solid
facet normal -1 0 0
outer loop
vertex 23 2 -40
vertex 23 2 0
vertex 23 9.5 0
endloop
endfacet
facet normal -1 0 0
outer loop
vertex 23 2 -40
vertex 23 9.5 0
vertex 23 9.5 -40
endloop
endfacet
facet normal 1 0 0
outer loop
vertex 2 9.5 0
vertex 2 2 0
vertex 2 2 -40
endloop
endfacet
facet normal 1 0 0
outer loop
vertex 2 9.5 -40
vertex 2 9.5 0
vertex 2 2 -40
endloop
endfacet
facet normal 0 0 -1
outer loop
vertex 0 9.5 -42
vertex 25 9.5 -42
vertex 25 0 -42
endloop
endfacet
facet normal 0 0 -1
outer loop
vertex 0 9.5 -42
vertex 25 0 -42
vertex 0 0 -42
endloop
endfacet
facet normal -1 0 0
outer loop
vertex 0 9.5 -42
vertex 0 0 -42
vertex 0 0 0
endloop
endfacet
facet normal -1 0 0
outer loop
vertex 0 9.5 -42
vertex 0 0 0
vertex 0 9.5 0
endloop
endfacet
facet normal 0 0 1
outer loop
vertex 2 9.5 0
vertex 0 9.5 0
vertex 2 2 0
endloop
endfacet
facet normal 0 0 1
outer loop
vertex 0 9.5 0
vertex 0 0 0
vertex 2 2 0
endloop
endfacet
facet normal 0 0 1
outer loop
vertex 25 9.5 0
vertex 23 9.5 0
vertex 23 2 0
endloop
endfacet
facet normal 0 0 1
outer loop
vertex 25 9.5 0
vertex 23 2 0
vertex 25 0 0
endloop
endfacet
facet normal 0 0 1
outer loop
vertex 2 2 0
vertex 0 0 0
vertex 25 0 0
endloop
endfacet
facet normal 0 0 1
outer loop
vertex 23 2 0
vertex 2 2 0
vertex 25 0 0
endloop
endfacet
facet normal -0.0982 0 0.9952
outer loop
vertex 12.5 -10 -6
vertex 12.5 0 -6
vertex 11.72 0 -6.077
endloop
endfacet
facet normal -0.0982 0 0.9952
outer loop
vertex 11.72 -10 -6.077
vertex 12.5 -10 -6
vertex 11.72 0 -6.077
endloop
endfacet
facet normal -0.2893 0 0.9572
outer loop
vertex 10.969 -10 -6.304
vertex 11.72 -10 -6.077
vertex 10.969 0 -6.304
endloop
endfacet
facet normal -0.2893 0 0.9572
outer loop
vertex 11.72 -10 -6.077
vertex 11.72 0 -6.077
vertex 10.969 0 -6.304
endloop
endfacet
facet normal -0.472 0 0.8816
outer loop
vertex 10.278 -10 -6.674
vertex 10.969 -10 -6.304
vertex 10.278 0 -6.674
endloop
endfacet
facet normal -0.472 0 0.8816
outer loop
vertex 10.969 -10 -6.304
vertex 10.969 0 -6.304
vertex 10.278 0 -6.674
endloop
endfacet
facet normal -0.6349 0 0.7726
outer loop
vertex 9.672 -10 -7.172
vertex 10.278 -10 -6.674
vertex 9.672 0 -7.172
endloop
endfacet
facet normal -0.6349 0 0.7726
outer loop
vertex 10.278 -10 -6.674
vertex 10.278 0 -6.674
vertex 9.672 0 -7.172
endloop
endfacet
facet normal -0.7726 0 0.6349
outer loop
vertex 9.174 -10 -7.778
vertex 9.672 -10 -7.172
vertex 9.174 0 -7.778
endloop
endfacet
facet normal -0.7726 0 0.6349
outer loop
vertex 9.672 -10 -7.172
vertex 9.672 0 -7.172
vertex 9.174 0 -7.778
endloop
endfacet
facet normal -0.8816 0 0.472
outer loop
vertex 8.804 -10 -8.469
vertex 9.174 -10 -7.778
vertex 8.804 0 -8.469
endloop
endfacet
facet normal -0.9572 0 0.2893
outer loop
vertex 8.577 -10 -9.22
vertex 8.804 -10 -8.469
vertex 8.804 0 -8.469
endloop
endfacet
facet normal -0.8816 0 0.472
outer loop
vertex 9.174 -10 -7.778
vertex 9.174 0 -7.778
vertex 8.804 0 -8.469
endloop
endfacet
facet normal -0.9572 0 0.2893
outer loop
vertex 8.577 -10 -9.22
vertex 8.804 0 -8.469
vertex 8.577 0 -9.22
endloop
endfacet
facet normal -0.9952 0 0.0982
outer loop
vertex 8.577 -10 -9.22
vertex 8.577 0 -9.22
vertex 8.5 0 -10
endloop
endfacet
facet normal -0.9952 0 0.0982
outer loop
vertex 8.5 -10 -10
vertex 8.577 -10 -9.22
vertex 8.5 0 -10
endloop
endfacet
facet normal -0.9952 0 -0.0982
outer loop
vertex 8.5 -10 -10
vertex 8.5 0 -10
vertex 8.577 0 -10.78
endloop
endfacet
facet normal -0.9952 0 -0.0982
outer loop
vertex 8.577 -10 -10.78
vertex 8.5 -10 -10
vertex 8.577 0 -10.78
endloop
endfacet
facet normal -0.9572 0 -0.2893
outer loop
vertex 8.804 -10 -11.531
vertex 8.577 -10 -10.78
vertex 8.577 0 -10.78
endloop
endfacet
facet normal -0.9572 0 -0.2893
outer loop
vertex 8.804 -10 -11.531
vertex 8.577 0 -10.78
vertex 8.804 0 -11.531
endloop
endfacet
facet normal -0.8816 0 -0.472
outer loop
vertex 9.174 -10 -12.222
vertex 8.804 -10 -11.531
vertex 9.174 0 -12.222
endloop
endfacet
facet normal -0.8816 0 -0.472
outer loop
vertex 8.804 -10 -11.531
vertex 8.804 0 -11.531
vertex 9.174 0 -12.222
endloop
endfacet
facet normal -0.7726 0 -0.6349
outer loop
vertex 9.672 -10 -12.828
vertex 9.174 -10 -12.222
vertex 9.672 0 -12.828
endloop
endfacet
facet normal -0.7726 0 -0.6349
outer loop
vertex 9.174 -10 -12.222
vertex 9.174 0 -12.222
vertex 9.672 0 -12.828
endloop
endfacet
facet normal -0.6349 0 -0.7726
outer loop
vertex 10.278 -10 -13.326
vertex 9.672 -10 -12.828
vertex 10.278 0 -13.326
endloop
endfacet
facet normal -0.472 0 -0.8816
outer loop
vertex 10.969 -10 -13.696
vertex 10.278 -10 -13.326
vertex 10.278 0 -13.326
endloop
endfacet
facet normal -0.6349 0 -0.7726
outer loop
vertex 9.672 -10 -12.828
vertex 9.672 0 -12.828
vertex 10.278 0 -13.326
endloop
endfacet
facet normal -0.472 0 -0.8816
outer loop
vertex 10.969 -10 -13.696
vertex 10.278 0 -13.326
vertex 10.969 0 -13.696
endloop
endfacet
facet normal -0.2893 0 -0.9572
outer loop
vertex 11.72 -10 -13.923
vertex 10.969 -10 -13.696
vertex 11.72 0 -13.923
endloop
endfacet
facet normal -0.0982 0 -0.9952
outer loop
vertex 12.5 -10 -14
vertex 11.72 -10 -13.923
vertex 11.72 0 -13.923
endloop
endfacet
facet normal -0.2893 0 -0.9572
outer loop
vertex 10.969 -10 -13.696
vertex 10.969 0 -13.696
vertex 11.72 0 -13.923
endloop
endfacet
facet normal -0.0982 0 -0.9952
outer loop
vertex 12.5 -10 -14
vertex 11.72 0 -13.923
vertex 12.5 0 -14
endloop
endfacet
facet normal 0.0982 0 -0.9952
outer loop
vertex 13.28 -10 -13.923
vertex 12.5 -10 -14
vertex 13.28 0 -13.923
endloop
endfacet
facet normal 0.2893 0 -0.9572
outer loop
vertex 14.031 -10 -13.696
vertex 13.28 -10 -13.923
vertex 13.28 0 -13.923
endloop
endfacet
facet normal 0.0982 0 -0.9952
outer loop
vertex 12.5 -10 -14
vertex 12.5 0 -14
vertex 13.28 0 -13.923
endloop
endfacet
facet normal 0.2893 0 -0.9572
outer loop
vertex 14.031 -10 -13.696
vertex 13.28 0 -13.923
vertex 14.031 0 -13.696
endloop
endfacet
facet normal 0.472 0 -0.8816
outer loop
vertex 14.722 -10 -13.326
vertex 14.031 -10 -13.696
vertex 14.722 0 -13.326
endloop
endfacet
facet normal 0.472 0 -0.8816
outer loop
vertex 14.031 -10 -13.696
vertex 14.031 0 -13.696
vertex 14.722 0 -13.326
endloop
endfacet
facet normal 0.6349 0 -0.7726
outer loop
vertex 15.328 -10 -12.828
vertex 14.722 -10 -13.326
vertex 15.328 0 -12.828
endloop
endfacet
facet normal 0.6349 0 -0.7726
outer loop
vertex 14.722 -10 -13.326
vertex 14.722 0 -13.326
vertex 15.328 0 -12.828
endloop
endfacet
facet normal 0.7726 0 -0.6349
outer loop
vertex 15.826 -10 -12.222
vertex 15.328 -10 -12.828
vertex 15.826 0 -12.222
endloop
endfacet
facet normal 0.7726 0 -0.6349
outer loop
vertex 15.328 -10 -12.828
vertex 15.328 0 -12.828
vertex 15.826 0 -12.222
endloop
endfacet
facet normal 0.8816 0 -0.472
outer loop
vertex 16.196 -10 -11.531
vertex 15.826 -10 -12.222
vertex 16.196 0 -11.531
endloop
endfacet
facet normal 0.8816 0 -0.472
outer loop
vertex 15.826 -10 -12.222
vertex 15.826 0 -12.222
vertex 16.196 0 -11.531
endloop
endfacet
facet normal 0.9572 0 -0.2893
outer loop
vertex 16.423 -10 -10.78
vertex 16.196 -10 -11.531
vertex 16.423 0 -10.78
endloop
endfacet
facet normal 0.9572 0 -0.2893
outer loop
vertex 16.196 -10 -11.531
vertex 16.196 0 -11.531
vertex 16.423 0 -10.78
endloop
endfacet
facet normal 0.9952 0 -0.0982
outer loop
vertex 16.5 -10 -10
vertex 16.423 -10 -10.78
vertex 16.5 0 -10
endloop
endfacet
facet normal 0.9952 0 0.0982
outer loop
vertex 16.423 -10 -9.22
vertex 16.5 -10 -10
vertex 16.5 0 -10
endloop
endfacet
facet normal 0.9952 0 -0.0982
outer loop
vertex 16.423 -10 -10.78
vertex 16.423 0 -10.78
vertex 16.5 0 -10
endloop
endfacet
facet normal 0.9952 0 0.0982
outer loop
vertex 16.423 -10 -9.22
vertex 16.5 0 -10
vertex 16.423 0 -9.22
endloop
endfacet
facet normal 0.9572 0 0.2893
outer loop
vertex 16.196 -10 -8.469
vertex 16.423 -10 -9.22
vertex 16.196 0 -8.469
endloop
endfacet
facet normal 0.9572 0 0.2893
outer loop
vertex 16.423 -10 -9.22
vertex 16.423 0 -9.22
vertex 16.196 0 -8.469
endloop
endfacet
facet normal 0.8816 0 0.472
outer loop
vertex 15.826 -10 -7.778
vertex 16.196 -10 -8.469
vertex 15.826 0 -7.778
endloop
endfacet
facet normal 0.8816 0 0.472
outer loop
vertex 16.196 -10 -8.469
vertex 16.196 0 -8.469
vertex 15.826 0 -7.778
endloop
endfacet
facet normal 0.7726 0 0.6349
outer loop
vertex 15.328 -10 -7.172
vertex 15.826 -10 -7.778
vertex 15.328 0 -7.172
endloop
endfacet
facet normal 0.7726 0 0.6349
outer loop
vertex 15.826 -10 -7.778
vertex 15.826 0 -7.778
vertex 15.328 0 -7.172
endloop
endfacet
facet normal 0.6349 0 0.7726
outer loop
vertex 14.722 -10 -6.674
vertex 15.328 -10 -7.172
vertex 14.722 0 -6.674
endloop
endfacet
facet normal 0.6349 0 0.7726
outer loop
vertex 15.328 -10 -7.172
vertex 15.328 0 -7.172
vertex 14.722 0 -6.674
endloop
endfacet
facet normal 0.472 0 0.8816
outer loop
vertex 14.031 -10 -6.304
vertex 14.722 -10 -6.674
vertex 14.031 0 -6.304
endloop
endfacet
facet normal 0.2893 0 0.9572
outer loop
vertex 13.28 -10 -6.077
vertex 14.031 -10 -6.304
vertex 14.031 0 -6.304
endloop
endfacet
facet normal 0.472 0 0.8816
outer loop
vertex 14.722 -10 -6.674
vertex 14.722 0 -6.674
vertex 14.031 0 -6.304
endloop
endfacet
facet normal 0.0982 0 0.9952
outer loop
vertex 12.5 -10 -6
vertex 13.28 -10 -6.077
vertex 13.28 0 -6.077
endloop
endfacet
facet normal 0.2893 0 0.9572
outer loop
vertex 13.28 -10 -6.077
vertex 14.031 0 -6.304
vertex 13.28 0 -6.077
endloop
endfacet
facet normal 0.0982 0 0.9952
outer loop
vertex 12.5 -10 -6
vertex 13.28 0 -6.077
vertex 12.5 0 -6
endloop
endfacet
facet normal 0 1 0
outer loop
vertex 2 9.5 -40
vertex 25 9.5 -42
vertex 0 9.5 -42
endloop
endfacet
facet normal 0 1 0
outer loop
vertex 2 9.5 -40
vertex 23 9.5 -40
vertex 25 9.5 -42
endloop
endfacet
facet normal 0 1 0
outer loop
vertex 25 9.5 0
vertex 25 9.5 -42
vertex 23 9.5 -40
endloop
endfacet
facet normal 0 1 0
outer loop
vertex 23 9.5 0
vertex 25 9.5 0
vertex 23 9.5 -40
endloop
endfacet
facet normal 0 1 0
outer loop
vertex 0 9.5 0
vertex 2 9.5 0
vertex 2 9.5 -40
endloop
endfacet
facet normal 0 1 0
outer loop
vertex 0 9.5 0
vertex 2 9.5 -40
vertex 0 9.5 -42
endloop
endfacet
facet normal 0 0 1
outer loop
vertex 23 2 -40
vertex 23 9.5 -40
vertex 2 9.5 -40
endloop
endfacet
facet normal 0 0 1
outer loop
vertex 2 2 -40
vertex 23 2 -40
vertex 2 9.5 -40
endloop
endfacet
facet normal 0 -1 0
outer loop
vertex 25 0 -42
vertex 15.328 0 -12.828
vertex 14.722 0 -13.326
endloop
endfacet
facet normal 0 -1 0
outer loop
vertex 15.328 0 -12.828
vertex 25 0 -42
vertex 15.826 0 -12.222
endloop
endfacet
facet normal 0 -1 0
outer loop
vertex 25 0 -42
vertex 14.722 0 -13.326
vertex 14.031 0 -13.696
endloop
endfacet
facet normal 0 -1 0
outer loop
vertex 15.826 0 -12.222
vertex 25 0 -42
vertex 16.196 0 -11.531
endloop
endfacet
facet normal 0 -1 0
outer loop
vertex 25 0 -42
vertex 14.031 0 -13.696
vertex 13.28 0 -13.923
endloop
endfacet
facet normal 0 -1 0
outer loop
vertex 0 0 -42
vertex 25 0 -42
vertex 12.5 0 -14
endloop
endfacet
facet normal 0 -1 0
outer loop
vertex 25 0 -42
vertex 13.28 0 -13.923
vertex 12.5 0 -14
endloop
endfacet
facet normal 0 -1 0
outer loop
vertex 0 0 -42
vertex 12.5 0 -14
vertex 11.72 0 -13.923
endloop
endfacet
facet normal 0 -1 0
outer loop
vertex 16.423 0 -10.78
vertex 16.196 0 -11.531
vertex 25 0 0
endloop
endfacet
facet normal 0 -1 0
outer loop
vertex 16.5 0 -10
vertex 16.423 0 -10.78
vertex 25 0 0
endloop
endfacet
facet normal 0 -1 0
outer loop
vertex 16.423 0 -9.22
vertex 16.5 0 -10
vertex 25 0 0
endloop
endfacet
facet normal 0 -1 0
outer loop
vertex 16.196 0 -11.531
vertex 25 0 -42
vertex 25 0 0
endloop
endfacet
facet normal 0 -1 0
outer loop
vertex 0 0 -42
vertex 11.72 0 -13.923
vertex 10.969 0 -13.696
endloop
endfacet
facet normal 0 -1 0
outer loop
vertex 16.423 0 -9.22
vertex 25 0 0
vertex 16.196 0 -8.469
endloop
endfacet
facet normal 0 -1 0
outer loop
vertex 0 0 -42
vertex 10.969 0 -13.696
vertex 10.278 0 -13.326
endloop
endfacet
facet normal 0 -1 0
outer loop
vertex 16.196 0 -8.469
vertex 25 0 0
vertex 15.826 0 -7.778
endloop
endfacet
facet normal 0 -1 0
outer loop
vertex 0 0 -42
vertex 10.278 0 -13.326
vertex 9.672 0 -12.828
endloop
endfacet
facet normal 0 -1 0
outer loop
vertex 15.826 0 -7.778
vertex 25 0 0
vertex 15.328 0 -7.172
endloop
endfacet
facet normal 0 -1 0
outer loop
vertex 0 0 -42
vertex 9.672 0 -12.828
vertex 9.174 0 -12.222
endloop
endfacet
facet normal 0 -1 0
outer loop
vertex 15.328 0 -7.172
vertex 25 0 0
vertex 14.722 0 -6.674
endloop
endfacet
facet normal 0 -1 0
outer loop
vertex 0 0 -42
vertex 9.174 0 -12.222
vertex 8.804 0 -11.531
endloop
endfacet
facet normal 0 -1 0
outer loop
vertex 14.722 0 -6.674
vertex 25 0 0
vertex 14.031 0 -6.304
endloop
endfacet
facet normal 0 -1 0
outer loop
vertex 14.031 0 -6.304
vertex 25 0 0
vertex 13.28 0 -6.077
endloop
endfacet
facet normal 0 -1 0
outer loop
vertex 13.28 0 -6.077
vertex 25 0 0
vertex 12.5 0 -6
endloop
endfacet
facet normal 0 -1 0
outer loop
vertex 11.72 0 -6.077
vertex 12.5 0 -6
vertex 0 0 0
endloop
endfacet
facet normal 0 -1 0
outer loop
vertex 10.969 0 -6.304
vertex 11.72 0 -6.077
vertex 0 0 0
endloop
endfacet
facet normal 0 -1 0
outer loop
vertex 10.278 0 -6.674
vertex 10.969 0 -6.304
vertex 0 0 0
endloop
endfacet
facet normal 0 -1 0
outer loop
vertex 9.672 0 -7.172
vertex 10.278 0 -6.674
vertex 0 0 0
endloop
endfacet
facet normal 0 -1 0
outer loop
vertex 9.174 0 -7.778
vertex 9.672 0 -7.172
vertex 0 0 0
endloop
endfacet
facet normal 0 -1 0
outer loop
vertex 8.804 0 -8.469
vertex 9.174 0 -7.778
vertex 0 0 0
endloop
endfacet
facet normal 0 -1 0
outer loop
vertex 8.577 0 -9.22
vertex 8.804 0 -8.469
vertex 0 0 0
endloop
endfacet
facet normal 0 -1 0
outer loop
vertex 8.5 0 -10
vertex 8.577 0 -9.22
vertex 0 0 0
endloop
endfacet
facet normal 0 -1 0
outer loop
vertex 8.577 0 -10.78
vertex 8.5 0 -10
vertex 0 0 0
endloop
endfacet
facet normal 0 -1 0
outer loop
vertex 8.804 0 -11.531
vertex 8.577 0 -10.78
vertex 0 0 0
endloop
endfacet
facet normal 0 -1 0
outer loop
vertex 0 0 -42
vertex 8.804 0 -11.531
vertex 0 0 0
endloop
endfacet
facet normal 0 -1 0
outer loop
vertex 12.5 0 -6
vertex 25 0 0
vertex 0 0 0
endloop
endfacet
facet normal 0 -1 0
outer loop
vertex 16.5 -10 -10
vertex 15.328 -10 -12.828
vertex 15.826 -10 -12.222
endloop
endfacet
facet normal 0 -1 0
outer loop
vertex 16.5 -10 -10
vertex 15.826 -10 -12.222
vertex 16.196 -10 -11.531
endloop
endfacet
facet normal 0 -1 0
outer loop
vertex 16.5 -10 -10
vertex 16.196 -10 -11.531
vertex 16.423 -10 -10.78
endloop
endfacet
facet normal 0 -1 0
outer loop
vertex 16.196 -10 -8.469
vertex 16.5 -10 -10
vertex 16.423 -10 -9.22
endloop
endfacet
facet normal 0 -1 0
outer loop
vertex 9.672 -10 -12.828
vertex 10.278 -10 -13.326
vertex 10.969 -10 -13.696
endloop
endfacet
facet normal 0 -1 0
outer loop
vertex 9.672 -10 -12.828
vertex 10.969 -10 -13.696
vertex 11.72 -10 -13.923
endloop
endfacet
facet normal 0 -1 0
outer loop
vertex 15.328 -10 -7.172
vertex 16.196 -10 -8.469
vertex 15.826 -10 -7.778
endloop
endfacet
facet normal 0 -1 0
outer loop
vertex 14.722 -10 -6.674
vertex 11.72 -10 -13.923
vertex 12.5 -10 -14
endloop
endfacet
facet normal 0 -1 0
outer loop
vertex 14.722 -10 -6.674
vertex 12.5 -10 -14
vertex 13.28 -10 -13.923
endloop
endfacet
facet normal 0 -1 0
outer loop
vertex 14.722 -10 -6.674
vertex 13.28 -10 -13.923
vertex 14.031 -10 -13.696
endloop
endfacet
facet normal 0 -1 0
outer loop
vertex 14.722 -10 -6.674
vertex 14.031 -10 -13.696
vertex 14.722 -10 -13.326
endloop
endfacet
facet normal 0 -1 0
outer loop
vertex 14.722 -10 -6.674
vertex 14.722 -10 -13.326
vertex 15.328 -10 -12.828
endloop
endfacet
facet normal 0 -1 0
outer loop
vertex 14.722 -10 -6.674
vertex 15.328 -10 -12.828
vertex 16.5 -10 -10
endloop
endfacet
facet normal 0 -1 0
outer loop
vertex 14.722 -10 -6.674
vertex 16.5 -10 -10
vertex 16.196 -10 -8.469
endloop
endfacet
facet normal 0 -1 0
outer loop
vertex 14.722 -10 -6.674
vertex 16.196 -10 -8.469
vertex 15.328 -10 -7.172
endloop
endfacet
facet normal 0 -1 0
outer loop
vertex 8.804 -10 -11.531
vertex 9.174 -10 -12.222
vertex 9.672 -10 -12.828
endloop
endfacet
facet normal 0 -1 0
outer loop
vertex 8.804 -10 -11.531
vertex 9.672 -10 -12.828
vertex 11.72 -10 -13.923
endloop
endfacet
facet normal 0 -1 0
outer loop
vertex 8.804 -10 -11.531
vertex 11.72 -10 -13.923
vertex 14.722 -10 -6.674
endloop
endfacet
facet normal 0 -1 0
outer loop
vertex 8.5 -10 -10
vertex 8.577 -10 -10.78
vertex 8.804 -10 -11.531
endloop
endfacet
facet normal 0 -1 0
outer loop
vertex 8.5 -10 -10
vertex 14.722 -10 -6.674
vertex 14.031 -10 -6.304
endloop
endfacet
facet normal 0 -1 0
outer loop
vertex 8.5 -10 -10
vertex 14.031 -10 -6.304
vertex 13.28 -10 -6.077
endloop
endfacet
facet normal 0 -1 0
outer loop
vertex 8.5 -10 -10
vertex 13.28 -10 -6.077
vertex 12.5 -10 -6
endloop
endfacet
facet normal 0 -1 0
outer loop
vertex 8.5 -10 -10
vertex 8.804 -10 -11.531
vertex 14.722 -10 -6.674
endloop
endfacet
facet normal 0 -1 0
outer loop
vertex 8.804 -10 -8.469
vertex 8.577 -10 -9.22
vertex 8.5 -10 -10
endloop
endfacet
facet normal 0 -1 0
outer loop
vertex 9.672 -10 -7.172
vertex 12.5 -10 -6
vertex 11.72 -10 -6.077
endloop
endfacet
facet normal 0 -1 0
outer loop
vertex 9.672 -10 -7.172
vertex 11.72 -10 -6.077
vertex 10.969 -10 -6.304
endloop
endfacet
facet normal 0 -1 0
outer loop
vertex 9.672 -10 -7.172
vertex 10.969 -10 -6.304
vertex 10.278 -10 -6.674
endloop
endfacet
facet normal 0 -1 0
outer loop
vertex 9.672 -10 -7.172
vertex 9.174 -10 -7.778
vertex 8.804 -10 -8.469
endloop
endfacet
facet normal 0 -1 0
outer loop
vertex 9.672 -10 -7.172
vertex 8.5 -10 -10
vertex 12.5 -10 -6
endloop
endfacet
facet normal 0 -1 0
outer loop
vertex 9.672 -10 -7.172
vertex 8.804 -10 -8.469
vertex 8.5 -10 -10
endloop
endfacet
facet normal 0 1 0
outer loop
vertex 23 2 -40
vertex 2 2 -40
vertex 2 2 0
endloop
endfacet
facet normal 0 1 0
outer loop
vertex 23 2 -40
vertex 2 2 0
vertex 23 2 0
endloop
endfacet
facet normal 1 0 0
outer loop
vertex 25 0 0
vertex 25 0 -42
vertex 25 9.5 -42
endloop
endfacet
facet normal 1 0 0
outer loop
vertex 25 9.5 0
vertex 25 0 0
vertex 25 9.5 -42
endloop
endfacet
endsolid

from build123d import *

# Parameters (mm, degrees)
SKETCH1_W           = 25
SKETCH1_H           = 40
BOSS_EXTRUDE1_DEPTH = 2
SKETCH2_W           = 2
SKETCH2_H           = 40
BOSS_EXTRUDE2_DEPTH = 7.5
SKETCH3_R           = 4
BOSS_EXTRUDE3_DEPTH = 10
SKETCH4_W           = 25
SKETCH4_H           = 9.5
BOSS_EXTRUDE4_DEPTH = 2


with BuildPart() as part:
    # Sketch1 → Boss-Extrude1 (new body)
    with BuildSketch(Plane(origin=(0, 0, 0), x_dir=(1, 0, 0), z_dir=(0, 1, 0))):
        with Locations((12.5, 20)):
            Rectangle(SKETCH1_W, SKETCH1_H)
    extrude(amount=BOSS_EXTRUDE1_DEPTH)

    # Sketch2 → Boss-Extrude2 (add)
    with BuildSketch(Plane(origin=(0, 2, 0), x_dir=(1, 0, 0), z_dir=(0, 1, 0))):
        with Locations((1, 20)):
            Rectangle(SKETCH2_W, SKETCH2_H)
        with Locations((24, 20)):
            Rectangle(SKETCH2_W, SKETCH2_H)
    extrude(amount=BOSS_EXTRUDE2_DEPTH)

    # Sketch3 → Boss-Extrude3 (add)
    with BuildSketch(Plane(origin=(0, 0, 0), x_dir=(-1, 0, 0), z_dir=(0, -1, 0))):
        with Locations(Location((-12.5, 10, 0), (0, 0, 270))):
            Circle(SKETCH3_R)
    extrude(amount=BOSS_EXTRUDE3_DEPTH)

    # Sketch4 → Boss-Extrude4 (add)
    with BuildSketch(Plane(origin=(0, 0, -40), x_dir=(-1, 0, 0), z_dir=(0, 0, -1))):
        with Locations((-12.5, 4.75)):
            Rectangle(SKETCH4_W, SKETCH4_H)
    extrude(amount=BOSS_EXTRUDE4_DEPTH)


solid = part.part
